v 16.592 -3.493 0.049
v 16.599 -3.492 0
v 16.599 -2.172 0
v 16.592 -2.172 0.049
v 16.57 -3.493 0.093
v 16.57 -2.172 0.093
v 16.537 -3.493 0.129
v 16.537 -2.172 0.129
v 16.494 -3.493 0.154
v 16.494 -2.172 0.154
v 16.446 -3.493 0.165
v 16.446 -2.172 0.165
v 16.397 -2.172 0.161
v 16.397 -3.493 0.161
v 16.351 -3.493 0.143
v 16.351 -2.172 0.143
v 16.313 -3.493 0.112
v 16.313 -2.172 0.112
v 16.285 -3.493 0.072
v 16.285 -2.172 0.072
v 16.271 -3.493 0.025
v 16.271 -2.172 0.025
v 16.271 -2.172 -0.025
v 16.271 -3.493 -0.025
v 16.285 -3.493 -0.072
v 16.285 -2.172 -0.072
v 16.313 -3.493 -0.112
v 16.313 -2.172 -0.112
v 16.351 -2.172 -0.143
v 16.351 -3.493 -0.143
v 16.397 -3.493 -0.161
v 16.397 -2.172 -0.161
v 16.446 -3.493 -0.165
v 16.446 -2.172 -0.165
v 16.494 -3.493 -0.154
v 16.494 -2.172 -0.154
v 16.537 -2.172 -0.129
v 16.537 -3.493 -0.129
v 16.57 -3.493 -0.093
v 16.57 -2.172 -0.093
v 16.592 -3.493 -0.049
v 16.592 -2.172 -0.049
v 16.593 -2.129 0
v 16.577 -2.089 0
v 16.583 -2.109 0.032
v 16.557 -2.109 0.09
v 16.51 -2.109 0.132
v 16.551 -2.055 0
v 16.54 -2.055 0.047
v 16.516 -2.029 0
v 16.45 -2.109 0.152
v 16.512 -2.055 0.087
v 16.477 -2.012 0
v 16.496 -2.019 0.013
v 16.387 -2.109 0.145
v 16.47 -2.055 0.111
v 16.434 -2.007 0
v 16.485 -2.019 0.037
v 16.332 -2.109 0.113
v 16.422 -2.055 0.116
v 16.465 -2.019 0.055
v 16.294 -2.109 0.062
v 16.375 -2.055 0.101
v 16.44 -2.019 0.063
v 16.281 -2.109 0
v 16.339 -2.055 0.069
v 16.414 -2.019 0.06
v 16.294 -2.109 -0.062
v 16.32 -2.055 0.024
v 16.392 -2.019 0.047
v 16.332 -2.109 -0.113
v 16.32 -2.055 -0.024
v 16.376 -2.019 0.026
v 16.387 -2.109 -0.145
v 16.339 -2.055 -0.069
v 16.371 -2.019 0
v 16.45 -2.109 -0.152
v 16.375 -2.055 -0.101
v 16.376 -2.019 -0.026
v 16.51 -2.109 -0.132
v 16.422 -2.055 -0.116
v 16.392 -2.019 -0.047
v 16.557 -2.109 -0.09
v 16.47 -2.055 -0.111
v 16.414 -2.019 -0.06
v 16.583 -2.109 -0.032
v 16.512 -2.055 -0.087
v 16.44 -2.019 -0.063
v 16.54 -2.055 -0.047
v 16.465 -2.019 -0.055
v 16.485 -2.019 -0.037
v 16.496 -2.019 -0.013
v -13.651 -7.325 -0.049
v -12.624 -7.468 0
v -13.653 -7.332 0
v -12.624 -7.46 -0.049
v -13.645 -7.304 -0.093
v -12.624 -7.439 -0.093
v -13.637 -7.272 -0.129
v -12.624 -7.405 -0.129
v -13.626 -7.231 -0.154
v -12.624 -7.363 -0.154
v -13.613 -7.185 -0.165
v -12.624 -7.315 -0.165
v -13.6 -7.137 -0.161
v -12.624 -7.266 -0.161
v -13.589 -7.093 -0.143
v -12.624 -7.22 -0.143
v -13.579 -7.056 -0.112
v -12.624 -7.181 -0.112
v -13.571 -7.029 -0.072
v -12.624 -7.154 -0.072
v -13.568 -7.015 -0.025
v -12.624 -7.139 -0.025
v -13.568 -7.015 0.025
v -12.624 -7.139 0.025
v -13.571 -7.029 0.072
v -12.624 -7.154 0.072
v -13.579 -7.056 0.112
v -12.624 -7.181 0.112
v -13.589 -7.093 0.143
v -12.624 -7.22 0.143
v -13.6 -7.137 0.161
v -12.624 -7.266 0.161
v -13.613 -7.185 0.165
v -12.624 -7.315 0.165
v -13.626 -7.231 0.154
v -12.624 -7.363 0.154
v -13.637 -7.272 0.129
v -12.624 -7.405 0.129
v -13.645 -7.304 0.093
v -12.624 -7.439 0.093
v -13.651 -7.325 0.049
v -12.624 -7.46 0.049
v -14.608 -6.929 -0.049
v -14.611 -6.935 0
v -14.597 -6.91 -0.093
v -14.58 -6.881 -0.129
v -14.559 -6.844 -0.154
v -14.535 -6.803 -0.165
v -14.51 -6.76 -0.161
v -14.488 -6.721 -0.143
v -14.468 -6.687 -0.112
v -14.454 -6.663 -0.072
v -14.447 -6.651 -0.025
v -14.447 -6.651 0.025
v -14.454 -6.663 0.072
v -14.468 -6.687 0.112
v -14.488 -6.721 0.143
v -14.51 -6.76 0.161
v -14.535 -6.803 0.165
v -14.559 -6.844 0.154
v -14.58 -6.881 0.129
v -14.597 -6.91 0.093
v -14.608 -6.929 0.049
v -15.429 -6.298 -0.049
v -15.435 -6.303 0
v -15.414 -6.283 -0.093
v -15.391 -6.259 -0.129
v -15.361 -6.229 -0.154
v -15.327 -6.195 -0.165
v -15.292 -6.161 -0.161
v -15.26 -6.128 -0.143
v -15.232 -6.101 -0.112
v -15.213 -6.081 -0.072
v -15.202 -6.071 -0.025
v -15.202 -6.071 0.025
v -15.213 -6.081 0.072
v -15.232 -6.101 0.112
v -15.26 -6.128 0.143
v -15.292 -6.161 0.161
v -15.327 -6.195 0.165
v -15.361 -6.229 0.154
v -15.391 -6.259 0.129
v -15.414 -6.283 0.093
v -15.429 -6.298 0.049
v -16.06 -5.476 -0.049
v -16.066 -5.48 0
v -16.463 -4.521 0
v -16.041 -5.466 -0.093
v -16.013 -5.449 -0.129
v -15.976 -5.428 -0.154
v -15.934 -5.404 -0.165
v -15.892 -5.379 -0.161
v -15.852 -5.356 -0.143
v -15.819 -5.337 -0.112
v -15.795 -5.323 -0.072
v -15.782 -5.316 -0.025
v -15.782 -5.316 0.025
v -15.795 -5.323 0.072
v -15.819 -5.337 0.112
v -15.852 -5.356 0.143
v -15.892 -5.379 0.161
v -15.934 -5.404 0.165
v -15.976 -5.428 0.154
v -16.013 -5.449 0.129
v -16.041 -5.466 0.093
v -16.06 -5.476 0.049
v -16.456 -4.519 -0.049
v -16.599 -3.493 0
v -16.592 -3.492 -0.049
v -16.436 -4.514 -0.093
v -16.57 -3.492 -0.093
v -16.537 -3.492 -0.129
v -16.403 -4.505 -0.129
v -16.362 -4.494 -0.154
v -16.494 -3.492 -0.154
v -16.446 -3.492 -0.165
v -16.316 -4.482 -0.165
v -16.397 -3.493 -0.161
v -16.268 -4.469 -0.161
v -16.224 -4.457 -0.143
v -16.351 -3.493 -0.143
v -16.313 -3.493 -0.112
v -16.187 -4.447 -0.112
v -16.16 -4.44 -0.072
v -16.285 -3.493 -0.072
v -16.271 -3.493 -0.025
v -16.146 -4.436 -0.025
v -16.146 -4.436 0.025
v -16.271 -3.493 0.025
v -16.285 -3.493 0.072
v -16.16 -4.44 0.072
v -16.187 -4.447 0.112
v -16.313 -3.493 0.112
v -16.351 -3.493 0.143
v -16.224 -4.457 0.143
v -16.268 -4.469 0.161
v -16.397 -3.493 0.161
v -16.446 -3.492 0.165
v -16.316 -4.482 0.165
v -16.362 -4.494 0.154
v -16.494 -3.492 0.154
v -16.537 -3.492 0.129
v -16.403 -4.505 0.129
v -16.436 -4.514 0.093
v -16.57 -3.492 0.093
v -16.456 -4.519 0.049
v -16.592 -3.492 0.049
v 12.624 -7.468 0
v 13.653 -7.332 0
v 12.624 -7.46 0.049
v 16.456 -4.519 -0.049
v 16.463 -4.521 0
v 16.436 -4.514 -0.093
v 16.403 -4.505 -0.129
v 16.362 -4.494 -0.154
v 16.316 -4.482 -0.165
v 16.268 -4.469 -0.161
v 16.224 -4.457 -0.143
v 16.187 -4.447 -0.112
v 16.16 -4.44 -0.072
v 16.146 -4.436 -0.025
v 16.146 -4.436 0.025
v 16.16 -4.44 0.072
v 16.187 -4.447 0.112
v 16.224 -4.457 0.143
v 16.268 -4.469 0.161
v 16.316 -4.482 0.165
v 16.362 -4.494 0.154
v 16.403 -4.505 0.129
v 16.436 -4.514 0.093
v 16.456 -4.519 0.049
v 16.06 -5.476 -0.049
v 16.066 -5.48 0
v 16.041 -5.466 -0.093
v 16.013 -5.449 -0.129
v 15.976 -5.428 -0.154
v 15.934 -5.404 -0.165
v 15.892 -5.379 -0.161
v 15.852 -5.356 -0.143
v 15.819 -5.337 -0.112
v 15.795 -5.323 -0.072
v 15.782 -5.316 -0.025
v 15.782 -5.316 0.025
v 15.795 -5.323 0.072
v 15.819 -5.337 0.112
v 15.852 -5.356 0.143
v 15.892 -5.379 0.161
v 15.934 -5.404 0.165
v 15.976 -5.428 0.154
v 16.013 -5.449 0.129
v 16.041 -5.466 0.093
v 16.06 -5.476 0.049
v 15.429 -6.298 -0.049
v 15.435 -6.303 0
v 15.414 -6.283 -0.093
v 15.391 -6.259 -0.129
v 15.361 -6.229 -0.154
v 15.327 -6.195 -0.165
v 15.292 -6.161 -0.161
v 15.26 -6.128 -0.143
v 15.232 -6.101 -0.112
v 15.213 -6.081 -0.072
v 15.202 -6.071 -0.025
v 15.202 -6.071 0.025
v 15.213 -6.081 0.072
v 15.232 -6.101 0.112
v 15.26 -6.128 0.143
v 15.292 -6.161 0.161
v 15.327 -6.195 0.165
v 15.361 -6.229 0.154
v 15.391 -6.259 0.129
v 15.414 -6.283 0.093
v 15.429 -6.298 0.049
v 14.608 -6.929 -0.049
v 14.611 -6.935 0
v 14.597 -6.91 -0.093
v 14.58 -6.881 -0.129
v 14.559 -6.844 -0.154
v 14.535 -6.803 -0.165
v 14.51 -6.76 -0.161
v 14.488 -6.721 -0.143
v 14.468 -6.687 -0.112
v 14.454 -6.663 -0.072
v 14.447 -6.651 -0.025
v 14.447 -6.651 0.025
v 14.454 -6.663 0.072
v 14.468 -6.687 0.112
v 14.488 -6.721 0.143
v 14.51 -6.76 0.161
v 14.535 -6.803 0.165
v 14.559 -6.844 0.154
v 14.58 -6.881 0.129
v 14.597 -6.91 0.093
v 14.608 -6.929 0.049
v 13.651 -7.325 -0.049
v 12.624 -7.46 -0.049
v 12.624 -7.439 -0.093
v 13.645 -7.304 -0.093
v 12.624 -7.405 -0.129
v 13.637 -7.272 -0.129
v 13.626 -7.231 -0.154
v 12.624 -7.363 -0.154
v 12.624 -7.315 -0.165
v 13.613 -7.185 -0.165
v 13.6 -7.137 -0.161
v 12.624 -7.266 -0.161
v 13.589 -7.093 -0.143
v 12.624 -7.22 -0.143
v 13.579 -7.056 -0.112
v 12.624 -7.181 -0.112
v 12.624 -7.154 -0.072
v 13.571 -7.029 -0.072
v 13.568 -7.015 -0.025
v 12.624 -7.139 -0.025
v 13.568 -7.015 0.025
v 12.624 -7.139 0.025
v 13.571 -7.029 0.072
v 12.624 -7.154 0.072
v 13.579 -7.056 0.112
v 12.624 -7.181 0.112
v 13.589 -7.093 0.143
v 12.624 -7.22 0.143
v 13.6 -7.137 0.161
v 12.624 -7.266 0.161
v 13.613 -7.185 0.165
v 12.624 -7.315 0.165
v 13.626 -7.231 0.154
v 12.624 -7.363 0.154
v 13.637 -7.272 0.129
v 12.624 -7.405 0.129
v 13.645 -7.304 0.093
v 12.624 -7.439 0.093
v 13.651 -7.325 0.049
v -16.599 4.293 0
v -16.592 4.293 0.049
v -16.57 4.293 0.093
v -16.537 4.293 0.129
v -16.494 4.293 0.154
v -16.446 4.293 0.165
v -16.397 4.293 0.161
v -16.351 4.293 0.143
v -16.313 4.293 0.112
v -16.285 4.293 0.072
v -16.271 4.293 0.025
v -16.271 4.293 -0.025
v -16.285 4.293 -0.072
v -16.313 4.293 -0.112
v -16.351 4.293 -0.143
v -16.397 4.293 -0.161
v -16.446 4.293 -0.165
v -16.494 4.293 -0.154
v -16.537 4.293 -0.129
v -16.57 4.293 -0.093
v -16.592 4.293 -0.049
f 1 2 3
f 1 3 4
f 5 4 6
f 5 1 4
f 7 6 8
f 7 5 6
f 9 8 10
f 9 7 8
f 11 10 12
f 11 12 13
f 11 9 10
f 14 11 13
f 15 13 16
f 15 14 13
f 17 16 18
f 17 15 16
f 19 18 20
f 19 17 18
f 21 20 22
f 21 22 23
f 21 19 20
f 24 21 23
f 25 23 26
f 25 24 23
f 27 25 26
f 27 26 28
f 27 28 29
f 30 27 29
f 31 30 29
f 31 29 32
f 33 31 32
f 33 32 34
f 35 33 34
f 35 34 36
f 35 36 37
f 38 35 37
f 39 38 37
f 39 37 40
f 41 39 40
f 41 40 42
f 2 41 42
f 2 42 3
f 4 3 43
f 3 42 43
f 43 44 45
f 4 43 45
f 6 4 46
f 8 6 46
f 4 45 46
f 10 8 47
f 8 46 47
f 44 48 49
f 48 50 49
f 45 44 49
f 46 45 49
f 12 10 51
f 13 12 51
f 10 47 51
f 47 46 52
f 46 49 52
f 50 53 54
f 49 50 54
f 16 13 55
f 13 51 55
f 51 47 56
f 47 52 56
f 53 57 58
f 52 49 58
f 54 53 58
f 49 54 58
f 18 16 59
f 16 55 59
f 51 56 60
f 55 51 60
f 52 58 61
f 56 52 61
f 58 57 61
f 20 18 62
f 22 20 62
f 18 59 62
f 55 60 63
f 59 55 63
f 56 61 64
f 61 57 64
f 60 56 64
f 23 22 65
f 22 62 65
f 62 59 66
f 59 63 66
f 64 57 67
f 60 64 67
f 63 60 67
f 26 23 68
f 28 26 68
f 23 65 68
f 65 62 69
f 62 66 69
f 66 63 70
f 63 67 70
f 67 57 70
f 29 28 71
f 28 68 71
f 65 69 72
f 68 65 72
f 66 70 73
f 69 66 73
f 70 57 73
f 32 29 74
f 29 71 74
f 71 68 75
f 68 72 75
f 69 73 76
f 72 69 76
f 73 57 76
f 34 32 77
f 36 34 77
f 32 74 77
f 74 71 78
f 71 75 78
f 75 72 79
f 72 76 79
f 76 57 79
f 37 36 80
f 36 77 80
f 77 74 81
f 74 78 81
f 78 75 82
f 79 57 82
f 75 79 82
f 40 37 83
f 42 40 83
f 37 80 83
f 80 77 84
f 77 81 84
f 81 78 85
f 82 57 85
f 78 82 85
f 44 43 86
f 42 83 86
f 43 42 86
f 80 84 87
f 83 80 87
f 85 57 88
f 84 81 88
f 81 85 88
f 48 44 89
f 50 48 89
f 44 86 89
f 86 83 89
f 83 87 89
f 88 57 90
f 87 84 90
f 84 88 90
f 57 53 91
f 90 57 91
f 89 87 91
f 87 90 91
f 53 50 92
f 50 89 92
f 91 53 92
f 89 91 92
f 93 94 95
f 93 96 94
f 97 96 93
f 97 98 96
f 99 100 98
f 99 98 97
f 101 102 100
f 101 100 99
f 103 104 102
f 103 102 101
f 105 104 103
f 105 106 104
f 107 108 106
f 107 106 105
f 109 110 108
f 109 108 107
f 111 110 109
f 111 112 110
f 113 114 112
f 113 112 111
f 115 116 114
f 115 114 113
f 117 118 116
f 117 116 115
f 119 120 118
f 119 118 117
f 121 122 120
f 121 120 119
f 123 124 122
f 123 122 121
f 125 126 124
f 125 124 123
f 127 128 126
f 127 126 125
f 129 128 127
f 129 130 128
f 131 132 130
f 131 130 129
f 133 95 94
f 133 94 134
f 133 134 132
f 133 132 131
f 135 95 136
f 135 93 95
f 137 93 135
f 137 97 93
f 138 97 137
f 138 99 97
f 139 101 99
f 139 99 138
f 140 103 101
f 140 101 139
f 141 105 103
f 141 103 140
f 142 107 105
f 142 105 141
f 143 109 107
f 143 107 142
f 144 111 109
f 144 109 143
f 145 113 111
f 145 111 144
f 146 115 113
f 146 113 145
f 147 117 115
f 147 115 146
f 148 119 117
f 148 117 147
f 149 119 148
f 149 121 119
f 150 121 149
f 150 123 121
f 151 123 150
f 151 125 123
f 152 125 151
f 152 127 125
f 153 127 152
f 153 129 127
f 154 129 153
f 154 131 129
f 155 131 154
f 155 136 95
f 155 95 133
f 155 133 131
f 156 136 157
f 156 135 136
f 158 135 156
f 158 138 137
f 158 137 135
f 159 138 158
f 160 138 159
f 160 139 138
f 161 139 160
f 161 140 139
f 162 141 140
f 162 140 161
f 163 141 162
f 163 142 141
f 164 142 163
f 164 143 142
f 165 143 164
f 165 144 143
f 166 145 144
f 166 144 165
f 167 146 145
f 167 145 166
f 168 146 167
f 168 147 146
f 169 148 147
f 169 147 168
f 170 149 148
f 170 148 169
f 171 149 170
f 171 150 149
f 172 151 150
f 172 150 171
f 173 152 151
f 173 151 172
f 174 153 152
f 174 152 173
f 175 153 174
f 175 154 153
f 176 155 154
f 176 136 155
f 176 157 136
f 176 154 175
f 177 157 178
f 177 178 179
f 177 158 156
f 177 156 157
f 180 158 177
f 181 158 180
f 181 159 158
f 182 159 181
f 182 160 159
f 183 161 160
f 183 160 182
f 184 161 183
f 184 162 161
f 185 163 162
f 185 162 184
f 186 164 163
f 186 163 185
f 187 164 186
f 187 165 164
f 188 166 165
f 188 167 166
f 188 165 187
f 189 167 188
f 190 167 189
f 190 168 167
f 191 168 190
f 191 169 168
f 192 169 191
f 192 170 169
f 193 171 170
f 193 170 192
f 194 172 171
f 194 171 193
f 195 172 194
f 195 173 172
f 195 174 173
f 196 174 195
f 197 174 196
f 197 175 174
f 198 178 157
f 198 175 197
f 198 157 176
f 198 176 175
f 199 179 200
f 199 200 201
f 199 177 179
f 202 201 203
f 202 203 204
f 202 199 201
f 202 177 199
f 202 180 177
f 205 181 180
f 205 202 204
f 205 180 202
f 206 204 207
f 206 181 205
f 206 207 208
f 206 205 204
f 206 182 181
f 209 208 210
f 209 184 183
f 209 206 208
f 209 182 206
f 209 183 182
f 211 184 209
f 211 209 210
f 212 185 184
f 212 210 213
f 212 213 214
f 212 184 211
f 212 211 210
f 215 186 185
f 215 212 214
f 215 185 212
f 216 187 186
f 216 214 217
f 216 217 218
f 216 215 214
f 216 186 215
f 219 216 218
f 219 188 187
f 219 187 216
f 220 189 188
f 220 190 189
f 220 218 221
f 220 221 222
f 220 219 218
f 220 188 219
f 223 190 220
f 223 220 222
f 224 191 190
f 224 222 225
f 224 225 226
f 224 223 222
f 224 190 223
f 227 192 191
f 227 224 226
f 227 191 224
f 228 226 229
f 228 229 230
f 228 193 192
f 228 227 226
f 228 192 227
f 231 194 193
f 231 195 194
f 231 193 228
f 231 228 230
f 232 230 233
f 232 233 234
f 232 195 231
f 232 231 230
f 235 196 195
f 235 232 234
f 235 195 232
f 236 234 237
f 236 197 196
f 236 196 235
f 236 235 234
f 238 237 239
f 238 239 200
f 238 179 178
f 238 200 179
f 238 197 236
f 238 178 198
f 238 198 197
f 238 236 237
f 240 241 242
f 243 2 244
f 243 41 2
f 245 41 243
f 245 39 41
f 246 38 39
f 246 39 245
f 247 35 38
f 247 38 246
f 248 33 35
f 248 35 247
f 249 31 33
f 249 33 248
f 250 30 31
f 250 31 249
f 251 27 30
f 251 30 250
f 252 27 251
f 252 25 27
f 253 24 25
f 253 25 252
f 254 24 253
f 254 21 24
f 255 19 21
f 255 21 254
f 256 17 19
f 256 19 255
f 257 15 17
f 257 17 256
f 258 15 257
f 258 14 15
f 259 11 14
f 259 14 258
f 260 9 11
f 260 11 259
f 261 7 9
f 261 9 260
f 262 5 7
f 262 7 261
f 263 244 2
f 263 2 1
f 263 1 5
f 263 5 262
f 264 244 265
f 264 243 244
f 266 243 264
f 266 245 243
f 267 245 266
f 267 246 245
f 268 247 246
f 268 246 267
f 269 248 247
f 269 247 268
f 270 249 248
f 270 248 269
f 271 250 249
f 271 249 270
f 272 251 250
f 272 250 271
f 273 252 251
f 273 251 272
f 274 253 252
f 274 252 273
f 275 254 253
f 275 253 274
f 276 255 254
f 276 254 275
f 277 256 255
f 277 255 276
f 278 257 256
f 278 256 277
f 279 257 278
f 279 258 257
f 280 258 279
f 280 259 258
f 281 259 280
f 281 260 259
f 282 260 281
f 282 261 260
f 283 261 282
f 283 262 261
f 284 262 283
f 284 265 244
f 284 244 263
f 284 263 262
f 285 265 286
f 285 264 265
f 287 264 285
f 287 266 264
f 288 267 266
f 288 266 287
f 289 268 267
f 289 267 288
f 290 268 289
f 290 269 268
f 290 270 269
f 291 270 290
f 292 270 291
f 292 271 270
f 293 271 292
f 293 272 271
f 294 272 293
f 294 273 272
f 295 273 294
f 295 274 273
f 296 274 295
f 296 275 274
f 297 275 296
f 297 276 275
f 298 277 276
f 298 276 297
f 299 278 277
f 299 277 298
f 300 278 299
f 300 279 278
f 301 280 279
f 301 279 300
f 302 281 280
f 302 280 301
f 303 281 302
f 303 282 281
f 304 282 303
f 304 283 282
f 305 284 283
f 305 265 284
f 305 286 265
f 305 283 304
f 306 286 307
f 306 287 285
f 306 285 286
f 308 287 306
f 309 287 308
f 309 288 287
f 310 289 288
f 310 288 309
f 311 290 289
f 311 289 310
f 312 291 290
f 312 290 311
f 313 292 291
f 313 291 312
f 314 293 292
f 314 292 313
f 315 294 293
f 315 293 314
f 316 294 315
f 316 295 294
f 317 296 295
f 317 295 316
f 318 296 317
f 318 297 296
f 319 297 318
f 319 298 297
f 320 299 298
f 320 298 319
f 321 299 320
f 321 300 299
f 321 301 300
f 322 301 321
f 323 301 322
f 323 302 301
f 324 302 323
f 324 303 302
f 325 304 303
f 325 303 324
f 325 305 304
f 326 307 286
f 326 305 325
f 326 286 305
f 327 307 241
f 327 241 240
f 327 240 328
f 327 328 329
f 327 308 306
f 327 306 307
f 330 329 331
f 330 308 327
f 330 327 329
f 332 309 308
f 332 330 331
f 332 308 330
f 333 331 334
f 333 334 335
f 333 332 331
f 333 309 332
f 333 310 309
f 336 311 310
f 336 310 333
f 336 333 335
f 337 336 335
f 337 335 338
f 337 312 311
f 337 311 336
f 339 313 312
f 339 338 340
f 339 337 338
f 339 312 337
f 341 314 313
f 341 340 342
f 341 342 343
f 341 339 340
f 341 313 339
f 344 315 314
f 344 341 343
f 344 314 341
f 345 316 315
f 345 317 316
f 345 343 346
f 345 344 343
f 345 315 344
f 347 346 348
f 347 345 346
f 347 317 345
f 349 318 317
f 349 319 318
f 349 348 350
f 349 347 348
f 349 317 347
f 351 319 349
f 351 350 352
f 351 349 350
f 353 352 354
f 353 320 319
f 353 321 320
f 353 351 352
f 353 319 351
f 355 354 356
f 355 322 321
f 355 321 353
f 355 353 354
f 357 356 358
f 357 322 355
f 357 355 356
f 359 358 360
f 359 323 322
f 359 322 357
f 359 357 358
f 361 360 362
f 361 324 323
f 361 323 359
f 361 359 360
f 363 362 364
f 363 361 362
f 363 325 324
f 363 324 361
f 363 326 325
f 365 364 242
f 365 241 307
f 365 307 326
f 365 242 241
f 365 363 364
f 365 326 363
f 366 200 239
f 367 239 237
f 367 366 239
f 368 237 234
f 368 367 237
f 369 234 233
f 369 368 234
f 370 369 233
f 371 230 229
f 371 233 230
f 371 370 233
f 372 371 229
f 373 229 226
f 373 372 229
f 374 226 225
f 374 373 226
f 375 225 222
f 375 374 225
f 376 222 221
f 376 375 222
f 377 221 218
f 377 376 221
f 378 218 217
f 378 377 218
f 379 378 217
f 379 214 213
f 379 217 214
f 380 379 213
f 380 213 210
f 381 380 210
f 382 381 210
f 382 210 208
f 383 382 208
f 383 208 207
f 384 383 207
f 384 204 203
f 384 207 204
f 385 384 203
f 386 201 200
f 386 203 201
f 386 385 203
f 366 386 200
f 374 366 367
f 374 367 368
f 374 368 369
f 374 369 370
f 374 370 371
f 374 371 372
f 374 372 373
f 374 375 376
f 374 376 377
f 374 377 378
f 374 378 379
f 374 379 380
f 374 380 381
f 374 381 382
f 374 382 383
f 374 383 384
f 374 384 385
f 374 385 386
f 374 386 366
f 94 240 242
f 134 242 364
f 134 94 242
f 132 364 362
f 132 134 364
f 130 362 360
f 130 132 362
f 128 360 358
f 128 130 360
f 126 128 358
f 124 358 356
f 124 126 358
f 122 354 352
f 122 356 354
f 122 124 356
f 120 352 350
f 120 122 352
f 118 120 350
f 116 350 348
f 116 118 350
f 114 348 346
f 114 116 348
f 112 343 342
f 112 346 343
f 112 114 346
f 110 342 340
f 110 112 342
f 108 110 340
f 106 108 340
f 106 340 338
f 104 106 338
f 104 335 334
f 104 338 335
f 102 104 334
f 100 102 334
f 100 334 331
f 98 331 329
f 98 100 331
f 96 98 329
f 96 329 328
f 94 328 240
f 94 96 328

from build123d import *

# Parameters (mm, degrees)
SKETCH3_R = 0.1651
FILLET1_R = 0.1651


with BuildPart() as part:
    # Sweep1: sweep along a path in Sketch2
    with BuildLine(Plane.XY) as sweep1_path:
        Line((16.5989, -2.0066), (16.5989, -3.4925))
        ThreePointArc((16.5989, -3.4925), (15.434620166, -6.303320166), (12.6238, -7.4676))
        Line((12.6238, -7.4676), (-12.6238, -7.4676))
        ThreePointArc((-12.6238, -7.4676), (-15.434620166, -6.303320166), (-16.5989, -3.4925))
        Line((-16.5989, -3.4925), (-16.5989, 4.2926))
    # Sketch3 → Sweep1 (sweep)
    with BuildSketch(Plane(origin=(0, 4.2926, 0), x_dir=(-1, 0, 0), z_dir=(0, 1, 0))):
        with Locations((16.4338, 0)):
            Circle(SKETCH3_R)
    sweep(path=sweep1_path.line)

    # Fillet1
    fillet1_edges = [part.edges().sort_by_distance(p)[0] for p in [
        (16.2687, -2.0066, 0),
    ]]
    fillet(fillet1_edges, radius=FILLET1_R)


solid = part.part
